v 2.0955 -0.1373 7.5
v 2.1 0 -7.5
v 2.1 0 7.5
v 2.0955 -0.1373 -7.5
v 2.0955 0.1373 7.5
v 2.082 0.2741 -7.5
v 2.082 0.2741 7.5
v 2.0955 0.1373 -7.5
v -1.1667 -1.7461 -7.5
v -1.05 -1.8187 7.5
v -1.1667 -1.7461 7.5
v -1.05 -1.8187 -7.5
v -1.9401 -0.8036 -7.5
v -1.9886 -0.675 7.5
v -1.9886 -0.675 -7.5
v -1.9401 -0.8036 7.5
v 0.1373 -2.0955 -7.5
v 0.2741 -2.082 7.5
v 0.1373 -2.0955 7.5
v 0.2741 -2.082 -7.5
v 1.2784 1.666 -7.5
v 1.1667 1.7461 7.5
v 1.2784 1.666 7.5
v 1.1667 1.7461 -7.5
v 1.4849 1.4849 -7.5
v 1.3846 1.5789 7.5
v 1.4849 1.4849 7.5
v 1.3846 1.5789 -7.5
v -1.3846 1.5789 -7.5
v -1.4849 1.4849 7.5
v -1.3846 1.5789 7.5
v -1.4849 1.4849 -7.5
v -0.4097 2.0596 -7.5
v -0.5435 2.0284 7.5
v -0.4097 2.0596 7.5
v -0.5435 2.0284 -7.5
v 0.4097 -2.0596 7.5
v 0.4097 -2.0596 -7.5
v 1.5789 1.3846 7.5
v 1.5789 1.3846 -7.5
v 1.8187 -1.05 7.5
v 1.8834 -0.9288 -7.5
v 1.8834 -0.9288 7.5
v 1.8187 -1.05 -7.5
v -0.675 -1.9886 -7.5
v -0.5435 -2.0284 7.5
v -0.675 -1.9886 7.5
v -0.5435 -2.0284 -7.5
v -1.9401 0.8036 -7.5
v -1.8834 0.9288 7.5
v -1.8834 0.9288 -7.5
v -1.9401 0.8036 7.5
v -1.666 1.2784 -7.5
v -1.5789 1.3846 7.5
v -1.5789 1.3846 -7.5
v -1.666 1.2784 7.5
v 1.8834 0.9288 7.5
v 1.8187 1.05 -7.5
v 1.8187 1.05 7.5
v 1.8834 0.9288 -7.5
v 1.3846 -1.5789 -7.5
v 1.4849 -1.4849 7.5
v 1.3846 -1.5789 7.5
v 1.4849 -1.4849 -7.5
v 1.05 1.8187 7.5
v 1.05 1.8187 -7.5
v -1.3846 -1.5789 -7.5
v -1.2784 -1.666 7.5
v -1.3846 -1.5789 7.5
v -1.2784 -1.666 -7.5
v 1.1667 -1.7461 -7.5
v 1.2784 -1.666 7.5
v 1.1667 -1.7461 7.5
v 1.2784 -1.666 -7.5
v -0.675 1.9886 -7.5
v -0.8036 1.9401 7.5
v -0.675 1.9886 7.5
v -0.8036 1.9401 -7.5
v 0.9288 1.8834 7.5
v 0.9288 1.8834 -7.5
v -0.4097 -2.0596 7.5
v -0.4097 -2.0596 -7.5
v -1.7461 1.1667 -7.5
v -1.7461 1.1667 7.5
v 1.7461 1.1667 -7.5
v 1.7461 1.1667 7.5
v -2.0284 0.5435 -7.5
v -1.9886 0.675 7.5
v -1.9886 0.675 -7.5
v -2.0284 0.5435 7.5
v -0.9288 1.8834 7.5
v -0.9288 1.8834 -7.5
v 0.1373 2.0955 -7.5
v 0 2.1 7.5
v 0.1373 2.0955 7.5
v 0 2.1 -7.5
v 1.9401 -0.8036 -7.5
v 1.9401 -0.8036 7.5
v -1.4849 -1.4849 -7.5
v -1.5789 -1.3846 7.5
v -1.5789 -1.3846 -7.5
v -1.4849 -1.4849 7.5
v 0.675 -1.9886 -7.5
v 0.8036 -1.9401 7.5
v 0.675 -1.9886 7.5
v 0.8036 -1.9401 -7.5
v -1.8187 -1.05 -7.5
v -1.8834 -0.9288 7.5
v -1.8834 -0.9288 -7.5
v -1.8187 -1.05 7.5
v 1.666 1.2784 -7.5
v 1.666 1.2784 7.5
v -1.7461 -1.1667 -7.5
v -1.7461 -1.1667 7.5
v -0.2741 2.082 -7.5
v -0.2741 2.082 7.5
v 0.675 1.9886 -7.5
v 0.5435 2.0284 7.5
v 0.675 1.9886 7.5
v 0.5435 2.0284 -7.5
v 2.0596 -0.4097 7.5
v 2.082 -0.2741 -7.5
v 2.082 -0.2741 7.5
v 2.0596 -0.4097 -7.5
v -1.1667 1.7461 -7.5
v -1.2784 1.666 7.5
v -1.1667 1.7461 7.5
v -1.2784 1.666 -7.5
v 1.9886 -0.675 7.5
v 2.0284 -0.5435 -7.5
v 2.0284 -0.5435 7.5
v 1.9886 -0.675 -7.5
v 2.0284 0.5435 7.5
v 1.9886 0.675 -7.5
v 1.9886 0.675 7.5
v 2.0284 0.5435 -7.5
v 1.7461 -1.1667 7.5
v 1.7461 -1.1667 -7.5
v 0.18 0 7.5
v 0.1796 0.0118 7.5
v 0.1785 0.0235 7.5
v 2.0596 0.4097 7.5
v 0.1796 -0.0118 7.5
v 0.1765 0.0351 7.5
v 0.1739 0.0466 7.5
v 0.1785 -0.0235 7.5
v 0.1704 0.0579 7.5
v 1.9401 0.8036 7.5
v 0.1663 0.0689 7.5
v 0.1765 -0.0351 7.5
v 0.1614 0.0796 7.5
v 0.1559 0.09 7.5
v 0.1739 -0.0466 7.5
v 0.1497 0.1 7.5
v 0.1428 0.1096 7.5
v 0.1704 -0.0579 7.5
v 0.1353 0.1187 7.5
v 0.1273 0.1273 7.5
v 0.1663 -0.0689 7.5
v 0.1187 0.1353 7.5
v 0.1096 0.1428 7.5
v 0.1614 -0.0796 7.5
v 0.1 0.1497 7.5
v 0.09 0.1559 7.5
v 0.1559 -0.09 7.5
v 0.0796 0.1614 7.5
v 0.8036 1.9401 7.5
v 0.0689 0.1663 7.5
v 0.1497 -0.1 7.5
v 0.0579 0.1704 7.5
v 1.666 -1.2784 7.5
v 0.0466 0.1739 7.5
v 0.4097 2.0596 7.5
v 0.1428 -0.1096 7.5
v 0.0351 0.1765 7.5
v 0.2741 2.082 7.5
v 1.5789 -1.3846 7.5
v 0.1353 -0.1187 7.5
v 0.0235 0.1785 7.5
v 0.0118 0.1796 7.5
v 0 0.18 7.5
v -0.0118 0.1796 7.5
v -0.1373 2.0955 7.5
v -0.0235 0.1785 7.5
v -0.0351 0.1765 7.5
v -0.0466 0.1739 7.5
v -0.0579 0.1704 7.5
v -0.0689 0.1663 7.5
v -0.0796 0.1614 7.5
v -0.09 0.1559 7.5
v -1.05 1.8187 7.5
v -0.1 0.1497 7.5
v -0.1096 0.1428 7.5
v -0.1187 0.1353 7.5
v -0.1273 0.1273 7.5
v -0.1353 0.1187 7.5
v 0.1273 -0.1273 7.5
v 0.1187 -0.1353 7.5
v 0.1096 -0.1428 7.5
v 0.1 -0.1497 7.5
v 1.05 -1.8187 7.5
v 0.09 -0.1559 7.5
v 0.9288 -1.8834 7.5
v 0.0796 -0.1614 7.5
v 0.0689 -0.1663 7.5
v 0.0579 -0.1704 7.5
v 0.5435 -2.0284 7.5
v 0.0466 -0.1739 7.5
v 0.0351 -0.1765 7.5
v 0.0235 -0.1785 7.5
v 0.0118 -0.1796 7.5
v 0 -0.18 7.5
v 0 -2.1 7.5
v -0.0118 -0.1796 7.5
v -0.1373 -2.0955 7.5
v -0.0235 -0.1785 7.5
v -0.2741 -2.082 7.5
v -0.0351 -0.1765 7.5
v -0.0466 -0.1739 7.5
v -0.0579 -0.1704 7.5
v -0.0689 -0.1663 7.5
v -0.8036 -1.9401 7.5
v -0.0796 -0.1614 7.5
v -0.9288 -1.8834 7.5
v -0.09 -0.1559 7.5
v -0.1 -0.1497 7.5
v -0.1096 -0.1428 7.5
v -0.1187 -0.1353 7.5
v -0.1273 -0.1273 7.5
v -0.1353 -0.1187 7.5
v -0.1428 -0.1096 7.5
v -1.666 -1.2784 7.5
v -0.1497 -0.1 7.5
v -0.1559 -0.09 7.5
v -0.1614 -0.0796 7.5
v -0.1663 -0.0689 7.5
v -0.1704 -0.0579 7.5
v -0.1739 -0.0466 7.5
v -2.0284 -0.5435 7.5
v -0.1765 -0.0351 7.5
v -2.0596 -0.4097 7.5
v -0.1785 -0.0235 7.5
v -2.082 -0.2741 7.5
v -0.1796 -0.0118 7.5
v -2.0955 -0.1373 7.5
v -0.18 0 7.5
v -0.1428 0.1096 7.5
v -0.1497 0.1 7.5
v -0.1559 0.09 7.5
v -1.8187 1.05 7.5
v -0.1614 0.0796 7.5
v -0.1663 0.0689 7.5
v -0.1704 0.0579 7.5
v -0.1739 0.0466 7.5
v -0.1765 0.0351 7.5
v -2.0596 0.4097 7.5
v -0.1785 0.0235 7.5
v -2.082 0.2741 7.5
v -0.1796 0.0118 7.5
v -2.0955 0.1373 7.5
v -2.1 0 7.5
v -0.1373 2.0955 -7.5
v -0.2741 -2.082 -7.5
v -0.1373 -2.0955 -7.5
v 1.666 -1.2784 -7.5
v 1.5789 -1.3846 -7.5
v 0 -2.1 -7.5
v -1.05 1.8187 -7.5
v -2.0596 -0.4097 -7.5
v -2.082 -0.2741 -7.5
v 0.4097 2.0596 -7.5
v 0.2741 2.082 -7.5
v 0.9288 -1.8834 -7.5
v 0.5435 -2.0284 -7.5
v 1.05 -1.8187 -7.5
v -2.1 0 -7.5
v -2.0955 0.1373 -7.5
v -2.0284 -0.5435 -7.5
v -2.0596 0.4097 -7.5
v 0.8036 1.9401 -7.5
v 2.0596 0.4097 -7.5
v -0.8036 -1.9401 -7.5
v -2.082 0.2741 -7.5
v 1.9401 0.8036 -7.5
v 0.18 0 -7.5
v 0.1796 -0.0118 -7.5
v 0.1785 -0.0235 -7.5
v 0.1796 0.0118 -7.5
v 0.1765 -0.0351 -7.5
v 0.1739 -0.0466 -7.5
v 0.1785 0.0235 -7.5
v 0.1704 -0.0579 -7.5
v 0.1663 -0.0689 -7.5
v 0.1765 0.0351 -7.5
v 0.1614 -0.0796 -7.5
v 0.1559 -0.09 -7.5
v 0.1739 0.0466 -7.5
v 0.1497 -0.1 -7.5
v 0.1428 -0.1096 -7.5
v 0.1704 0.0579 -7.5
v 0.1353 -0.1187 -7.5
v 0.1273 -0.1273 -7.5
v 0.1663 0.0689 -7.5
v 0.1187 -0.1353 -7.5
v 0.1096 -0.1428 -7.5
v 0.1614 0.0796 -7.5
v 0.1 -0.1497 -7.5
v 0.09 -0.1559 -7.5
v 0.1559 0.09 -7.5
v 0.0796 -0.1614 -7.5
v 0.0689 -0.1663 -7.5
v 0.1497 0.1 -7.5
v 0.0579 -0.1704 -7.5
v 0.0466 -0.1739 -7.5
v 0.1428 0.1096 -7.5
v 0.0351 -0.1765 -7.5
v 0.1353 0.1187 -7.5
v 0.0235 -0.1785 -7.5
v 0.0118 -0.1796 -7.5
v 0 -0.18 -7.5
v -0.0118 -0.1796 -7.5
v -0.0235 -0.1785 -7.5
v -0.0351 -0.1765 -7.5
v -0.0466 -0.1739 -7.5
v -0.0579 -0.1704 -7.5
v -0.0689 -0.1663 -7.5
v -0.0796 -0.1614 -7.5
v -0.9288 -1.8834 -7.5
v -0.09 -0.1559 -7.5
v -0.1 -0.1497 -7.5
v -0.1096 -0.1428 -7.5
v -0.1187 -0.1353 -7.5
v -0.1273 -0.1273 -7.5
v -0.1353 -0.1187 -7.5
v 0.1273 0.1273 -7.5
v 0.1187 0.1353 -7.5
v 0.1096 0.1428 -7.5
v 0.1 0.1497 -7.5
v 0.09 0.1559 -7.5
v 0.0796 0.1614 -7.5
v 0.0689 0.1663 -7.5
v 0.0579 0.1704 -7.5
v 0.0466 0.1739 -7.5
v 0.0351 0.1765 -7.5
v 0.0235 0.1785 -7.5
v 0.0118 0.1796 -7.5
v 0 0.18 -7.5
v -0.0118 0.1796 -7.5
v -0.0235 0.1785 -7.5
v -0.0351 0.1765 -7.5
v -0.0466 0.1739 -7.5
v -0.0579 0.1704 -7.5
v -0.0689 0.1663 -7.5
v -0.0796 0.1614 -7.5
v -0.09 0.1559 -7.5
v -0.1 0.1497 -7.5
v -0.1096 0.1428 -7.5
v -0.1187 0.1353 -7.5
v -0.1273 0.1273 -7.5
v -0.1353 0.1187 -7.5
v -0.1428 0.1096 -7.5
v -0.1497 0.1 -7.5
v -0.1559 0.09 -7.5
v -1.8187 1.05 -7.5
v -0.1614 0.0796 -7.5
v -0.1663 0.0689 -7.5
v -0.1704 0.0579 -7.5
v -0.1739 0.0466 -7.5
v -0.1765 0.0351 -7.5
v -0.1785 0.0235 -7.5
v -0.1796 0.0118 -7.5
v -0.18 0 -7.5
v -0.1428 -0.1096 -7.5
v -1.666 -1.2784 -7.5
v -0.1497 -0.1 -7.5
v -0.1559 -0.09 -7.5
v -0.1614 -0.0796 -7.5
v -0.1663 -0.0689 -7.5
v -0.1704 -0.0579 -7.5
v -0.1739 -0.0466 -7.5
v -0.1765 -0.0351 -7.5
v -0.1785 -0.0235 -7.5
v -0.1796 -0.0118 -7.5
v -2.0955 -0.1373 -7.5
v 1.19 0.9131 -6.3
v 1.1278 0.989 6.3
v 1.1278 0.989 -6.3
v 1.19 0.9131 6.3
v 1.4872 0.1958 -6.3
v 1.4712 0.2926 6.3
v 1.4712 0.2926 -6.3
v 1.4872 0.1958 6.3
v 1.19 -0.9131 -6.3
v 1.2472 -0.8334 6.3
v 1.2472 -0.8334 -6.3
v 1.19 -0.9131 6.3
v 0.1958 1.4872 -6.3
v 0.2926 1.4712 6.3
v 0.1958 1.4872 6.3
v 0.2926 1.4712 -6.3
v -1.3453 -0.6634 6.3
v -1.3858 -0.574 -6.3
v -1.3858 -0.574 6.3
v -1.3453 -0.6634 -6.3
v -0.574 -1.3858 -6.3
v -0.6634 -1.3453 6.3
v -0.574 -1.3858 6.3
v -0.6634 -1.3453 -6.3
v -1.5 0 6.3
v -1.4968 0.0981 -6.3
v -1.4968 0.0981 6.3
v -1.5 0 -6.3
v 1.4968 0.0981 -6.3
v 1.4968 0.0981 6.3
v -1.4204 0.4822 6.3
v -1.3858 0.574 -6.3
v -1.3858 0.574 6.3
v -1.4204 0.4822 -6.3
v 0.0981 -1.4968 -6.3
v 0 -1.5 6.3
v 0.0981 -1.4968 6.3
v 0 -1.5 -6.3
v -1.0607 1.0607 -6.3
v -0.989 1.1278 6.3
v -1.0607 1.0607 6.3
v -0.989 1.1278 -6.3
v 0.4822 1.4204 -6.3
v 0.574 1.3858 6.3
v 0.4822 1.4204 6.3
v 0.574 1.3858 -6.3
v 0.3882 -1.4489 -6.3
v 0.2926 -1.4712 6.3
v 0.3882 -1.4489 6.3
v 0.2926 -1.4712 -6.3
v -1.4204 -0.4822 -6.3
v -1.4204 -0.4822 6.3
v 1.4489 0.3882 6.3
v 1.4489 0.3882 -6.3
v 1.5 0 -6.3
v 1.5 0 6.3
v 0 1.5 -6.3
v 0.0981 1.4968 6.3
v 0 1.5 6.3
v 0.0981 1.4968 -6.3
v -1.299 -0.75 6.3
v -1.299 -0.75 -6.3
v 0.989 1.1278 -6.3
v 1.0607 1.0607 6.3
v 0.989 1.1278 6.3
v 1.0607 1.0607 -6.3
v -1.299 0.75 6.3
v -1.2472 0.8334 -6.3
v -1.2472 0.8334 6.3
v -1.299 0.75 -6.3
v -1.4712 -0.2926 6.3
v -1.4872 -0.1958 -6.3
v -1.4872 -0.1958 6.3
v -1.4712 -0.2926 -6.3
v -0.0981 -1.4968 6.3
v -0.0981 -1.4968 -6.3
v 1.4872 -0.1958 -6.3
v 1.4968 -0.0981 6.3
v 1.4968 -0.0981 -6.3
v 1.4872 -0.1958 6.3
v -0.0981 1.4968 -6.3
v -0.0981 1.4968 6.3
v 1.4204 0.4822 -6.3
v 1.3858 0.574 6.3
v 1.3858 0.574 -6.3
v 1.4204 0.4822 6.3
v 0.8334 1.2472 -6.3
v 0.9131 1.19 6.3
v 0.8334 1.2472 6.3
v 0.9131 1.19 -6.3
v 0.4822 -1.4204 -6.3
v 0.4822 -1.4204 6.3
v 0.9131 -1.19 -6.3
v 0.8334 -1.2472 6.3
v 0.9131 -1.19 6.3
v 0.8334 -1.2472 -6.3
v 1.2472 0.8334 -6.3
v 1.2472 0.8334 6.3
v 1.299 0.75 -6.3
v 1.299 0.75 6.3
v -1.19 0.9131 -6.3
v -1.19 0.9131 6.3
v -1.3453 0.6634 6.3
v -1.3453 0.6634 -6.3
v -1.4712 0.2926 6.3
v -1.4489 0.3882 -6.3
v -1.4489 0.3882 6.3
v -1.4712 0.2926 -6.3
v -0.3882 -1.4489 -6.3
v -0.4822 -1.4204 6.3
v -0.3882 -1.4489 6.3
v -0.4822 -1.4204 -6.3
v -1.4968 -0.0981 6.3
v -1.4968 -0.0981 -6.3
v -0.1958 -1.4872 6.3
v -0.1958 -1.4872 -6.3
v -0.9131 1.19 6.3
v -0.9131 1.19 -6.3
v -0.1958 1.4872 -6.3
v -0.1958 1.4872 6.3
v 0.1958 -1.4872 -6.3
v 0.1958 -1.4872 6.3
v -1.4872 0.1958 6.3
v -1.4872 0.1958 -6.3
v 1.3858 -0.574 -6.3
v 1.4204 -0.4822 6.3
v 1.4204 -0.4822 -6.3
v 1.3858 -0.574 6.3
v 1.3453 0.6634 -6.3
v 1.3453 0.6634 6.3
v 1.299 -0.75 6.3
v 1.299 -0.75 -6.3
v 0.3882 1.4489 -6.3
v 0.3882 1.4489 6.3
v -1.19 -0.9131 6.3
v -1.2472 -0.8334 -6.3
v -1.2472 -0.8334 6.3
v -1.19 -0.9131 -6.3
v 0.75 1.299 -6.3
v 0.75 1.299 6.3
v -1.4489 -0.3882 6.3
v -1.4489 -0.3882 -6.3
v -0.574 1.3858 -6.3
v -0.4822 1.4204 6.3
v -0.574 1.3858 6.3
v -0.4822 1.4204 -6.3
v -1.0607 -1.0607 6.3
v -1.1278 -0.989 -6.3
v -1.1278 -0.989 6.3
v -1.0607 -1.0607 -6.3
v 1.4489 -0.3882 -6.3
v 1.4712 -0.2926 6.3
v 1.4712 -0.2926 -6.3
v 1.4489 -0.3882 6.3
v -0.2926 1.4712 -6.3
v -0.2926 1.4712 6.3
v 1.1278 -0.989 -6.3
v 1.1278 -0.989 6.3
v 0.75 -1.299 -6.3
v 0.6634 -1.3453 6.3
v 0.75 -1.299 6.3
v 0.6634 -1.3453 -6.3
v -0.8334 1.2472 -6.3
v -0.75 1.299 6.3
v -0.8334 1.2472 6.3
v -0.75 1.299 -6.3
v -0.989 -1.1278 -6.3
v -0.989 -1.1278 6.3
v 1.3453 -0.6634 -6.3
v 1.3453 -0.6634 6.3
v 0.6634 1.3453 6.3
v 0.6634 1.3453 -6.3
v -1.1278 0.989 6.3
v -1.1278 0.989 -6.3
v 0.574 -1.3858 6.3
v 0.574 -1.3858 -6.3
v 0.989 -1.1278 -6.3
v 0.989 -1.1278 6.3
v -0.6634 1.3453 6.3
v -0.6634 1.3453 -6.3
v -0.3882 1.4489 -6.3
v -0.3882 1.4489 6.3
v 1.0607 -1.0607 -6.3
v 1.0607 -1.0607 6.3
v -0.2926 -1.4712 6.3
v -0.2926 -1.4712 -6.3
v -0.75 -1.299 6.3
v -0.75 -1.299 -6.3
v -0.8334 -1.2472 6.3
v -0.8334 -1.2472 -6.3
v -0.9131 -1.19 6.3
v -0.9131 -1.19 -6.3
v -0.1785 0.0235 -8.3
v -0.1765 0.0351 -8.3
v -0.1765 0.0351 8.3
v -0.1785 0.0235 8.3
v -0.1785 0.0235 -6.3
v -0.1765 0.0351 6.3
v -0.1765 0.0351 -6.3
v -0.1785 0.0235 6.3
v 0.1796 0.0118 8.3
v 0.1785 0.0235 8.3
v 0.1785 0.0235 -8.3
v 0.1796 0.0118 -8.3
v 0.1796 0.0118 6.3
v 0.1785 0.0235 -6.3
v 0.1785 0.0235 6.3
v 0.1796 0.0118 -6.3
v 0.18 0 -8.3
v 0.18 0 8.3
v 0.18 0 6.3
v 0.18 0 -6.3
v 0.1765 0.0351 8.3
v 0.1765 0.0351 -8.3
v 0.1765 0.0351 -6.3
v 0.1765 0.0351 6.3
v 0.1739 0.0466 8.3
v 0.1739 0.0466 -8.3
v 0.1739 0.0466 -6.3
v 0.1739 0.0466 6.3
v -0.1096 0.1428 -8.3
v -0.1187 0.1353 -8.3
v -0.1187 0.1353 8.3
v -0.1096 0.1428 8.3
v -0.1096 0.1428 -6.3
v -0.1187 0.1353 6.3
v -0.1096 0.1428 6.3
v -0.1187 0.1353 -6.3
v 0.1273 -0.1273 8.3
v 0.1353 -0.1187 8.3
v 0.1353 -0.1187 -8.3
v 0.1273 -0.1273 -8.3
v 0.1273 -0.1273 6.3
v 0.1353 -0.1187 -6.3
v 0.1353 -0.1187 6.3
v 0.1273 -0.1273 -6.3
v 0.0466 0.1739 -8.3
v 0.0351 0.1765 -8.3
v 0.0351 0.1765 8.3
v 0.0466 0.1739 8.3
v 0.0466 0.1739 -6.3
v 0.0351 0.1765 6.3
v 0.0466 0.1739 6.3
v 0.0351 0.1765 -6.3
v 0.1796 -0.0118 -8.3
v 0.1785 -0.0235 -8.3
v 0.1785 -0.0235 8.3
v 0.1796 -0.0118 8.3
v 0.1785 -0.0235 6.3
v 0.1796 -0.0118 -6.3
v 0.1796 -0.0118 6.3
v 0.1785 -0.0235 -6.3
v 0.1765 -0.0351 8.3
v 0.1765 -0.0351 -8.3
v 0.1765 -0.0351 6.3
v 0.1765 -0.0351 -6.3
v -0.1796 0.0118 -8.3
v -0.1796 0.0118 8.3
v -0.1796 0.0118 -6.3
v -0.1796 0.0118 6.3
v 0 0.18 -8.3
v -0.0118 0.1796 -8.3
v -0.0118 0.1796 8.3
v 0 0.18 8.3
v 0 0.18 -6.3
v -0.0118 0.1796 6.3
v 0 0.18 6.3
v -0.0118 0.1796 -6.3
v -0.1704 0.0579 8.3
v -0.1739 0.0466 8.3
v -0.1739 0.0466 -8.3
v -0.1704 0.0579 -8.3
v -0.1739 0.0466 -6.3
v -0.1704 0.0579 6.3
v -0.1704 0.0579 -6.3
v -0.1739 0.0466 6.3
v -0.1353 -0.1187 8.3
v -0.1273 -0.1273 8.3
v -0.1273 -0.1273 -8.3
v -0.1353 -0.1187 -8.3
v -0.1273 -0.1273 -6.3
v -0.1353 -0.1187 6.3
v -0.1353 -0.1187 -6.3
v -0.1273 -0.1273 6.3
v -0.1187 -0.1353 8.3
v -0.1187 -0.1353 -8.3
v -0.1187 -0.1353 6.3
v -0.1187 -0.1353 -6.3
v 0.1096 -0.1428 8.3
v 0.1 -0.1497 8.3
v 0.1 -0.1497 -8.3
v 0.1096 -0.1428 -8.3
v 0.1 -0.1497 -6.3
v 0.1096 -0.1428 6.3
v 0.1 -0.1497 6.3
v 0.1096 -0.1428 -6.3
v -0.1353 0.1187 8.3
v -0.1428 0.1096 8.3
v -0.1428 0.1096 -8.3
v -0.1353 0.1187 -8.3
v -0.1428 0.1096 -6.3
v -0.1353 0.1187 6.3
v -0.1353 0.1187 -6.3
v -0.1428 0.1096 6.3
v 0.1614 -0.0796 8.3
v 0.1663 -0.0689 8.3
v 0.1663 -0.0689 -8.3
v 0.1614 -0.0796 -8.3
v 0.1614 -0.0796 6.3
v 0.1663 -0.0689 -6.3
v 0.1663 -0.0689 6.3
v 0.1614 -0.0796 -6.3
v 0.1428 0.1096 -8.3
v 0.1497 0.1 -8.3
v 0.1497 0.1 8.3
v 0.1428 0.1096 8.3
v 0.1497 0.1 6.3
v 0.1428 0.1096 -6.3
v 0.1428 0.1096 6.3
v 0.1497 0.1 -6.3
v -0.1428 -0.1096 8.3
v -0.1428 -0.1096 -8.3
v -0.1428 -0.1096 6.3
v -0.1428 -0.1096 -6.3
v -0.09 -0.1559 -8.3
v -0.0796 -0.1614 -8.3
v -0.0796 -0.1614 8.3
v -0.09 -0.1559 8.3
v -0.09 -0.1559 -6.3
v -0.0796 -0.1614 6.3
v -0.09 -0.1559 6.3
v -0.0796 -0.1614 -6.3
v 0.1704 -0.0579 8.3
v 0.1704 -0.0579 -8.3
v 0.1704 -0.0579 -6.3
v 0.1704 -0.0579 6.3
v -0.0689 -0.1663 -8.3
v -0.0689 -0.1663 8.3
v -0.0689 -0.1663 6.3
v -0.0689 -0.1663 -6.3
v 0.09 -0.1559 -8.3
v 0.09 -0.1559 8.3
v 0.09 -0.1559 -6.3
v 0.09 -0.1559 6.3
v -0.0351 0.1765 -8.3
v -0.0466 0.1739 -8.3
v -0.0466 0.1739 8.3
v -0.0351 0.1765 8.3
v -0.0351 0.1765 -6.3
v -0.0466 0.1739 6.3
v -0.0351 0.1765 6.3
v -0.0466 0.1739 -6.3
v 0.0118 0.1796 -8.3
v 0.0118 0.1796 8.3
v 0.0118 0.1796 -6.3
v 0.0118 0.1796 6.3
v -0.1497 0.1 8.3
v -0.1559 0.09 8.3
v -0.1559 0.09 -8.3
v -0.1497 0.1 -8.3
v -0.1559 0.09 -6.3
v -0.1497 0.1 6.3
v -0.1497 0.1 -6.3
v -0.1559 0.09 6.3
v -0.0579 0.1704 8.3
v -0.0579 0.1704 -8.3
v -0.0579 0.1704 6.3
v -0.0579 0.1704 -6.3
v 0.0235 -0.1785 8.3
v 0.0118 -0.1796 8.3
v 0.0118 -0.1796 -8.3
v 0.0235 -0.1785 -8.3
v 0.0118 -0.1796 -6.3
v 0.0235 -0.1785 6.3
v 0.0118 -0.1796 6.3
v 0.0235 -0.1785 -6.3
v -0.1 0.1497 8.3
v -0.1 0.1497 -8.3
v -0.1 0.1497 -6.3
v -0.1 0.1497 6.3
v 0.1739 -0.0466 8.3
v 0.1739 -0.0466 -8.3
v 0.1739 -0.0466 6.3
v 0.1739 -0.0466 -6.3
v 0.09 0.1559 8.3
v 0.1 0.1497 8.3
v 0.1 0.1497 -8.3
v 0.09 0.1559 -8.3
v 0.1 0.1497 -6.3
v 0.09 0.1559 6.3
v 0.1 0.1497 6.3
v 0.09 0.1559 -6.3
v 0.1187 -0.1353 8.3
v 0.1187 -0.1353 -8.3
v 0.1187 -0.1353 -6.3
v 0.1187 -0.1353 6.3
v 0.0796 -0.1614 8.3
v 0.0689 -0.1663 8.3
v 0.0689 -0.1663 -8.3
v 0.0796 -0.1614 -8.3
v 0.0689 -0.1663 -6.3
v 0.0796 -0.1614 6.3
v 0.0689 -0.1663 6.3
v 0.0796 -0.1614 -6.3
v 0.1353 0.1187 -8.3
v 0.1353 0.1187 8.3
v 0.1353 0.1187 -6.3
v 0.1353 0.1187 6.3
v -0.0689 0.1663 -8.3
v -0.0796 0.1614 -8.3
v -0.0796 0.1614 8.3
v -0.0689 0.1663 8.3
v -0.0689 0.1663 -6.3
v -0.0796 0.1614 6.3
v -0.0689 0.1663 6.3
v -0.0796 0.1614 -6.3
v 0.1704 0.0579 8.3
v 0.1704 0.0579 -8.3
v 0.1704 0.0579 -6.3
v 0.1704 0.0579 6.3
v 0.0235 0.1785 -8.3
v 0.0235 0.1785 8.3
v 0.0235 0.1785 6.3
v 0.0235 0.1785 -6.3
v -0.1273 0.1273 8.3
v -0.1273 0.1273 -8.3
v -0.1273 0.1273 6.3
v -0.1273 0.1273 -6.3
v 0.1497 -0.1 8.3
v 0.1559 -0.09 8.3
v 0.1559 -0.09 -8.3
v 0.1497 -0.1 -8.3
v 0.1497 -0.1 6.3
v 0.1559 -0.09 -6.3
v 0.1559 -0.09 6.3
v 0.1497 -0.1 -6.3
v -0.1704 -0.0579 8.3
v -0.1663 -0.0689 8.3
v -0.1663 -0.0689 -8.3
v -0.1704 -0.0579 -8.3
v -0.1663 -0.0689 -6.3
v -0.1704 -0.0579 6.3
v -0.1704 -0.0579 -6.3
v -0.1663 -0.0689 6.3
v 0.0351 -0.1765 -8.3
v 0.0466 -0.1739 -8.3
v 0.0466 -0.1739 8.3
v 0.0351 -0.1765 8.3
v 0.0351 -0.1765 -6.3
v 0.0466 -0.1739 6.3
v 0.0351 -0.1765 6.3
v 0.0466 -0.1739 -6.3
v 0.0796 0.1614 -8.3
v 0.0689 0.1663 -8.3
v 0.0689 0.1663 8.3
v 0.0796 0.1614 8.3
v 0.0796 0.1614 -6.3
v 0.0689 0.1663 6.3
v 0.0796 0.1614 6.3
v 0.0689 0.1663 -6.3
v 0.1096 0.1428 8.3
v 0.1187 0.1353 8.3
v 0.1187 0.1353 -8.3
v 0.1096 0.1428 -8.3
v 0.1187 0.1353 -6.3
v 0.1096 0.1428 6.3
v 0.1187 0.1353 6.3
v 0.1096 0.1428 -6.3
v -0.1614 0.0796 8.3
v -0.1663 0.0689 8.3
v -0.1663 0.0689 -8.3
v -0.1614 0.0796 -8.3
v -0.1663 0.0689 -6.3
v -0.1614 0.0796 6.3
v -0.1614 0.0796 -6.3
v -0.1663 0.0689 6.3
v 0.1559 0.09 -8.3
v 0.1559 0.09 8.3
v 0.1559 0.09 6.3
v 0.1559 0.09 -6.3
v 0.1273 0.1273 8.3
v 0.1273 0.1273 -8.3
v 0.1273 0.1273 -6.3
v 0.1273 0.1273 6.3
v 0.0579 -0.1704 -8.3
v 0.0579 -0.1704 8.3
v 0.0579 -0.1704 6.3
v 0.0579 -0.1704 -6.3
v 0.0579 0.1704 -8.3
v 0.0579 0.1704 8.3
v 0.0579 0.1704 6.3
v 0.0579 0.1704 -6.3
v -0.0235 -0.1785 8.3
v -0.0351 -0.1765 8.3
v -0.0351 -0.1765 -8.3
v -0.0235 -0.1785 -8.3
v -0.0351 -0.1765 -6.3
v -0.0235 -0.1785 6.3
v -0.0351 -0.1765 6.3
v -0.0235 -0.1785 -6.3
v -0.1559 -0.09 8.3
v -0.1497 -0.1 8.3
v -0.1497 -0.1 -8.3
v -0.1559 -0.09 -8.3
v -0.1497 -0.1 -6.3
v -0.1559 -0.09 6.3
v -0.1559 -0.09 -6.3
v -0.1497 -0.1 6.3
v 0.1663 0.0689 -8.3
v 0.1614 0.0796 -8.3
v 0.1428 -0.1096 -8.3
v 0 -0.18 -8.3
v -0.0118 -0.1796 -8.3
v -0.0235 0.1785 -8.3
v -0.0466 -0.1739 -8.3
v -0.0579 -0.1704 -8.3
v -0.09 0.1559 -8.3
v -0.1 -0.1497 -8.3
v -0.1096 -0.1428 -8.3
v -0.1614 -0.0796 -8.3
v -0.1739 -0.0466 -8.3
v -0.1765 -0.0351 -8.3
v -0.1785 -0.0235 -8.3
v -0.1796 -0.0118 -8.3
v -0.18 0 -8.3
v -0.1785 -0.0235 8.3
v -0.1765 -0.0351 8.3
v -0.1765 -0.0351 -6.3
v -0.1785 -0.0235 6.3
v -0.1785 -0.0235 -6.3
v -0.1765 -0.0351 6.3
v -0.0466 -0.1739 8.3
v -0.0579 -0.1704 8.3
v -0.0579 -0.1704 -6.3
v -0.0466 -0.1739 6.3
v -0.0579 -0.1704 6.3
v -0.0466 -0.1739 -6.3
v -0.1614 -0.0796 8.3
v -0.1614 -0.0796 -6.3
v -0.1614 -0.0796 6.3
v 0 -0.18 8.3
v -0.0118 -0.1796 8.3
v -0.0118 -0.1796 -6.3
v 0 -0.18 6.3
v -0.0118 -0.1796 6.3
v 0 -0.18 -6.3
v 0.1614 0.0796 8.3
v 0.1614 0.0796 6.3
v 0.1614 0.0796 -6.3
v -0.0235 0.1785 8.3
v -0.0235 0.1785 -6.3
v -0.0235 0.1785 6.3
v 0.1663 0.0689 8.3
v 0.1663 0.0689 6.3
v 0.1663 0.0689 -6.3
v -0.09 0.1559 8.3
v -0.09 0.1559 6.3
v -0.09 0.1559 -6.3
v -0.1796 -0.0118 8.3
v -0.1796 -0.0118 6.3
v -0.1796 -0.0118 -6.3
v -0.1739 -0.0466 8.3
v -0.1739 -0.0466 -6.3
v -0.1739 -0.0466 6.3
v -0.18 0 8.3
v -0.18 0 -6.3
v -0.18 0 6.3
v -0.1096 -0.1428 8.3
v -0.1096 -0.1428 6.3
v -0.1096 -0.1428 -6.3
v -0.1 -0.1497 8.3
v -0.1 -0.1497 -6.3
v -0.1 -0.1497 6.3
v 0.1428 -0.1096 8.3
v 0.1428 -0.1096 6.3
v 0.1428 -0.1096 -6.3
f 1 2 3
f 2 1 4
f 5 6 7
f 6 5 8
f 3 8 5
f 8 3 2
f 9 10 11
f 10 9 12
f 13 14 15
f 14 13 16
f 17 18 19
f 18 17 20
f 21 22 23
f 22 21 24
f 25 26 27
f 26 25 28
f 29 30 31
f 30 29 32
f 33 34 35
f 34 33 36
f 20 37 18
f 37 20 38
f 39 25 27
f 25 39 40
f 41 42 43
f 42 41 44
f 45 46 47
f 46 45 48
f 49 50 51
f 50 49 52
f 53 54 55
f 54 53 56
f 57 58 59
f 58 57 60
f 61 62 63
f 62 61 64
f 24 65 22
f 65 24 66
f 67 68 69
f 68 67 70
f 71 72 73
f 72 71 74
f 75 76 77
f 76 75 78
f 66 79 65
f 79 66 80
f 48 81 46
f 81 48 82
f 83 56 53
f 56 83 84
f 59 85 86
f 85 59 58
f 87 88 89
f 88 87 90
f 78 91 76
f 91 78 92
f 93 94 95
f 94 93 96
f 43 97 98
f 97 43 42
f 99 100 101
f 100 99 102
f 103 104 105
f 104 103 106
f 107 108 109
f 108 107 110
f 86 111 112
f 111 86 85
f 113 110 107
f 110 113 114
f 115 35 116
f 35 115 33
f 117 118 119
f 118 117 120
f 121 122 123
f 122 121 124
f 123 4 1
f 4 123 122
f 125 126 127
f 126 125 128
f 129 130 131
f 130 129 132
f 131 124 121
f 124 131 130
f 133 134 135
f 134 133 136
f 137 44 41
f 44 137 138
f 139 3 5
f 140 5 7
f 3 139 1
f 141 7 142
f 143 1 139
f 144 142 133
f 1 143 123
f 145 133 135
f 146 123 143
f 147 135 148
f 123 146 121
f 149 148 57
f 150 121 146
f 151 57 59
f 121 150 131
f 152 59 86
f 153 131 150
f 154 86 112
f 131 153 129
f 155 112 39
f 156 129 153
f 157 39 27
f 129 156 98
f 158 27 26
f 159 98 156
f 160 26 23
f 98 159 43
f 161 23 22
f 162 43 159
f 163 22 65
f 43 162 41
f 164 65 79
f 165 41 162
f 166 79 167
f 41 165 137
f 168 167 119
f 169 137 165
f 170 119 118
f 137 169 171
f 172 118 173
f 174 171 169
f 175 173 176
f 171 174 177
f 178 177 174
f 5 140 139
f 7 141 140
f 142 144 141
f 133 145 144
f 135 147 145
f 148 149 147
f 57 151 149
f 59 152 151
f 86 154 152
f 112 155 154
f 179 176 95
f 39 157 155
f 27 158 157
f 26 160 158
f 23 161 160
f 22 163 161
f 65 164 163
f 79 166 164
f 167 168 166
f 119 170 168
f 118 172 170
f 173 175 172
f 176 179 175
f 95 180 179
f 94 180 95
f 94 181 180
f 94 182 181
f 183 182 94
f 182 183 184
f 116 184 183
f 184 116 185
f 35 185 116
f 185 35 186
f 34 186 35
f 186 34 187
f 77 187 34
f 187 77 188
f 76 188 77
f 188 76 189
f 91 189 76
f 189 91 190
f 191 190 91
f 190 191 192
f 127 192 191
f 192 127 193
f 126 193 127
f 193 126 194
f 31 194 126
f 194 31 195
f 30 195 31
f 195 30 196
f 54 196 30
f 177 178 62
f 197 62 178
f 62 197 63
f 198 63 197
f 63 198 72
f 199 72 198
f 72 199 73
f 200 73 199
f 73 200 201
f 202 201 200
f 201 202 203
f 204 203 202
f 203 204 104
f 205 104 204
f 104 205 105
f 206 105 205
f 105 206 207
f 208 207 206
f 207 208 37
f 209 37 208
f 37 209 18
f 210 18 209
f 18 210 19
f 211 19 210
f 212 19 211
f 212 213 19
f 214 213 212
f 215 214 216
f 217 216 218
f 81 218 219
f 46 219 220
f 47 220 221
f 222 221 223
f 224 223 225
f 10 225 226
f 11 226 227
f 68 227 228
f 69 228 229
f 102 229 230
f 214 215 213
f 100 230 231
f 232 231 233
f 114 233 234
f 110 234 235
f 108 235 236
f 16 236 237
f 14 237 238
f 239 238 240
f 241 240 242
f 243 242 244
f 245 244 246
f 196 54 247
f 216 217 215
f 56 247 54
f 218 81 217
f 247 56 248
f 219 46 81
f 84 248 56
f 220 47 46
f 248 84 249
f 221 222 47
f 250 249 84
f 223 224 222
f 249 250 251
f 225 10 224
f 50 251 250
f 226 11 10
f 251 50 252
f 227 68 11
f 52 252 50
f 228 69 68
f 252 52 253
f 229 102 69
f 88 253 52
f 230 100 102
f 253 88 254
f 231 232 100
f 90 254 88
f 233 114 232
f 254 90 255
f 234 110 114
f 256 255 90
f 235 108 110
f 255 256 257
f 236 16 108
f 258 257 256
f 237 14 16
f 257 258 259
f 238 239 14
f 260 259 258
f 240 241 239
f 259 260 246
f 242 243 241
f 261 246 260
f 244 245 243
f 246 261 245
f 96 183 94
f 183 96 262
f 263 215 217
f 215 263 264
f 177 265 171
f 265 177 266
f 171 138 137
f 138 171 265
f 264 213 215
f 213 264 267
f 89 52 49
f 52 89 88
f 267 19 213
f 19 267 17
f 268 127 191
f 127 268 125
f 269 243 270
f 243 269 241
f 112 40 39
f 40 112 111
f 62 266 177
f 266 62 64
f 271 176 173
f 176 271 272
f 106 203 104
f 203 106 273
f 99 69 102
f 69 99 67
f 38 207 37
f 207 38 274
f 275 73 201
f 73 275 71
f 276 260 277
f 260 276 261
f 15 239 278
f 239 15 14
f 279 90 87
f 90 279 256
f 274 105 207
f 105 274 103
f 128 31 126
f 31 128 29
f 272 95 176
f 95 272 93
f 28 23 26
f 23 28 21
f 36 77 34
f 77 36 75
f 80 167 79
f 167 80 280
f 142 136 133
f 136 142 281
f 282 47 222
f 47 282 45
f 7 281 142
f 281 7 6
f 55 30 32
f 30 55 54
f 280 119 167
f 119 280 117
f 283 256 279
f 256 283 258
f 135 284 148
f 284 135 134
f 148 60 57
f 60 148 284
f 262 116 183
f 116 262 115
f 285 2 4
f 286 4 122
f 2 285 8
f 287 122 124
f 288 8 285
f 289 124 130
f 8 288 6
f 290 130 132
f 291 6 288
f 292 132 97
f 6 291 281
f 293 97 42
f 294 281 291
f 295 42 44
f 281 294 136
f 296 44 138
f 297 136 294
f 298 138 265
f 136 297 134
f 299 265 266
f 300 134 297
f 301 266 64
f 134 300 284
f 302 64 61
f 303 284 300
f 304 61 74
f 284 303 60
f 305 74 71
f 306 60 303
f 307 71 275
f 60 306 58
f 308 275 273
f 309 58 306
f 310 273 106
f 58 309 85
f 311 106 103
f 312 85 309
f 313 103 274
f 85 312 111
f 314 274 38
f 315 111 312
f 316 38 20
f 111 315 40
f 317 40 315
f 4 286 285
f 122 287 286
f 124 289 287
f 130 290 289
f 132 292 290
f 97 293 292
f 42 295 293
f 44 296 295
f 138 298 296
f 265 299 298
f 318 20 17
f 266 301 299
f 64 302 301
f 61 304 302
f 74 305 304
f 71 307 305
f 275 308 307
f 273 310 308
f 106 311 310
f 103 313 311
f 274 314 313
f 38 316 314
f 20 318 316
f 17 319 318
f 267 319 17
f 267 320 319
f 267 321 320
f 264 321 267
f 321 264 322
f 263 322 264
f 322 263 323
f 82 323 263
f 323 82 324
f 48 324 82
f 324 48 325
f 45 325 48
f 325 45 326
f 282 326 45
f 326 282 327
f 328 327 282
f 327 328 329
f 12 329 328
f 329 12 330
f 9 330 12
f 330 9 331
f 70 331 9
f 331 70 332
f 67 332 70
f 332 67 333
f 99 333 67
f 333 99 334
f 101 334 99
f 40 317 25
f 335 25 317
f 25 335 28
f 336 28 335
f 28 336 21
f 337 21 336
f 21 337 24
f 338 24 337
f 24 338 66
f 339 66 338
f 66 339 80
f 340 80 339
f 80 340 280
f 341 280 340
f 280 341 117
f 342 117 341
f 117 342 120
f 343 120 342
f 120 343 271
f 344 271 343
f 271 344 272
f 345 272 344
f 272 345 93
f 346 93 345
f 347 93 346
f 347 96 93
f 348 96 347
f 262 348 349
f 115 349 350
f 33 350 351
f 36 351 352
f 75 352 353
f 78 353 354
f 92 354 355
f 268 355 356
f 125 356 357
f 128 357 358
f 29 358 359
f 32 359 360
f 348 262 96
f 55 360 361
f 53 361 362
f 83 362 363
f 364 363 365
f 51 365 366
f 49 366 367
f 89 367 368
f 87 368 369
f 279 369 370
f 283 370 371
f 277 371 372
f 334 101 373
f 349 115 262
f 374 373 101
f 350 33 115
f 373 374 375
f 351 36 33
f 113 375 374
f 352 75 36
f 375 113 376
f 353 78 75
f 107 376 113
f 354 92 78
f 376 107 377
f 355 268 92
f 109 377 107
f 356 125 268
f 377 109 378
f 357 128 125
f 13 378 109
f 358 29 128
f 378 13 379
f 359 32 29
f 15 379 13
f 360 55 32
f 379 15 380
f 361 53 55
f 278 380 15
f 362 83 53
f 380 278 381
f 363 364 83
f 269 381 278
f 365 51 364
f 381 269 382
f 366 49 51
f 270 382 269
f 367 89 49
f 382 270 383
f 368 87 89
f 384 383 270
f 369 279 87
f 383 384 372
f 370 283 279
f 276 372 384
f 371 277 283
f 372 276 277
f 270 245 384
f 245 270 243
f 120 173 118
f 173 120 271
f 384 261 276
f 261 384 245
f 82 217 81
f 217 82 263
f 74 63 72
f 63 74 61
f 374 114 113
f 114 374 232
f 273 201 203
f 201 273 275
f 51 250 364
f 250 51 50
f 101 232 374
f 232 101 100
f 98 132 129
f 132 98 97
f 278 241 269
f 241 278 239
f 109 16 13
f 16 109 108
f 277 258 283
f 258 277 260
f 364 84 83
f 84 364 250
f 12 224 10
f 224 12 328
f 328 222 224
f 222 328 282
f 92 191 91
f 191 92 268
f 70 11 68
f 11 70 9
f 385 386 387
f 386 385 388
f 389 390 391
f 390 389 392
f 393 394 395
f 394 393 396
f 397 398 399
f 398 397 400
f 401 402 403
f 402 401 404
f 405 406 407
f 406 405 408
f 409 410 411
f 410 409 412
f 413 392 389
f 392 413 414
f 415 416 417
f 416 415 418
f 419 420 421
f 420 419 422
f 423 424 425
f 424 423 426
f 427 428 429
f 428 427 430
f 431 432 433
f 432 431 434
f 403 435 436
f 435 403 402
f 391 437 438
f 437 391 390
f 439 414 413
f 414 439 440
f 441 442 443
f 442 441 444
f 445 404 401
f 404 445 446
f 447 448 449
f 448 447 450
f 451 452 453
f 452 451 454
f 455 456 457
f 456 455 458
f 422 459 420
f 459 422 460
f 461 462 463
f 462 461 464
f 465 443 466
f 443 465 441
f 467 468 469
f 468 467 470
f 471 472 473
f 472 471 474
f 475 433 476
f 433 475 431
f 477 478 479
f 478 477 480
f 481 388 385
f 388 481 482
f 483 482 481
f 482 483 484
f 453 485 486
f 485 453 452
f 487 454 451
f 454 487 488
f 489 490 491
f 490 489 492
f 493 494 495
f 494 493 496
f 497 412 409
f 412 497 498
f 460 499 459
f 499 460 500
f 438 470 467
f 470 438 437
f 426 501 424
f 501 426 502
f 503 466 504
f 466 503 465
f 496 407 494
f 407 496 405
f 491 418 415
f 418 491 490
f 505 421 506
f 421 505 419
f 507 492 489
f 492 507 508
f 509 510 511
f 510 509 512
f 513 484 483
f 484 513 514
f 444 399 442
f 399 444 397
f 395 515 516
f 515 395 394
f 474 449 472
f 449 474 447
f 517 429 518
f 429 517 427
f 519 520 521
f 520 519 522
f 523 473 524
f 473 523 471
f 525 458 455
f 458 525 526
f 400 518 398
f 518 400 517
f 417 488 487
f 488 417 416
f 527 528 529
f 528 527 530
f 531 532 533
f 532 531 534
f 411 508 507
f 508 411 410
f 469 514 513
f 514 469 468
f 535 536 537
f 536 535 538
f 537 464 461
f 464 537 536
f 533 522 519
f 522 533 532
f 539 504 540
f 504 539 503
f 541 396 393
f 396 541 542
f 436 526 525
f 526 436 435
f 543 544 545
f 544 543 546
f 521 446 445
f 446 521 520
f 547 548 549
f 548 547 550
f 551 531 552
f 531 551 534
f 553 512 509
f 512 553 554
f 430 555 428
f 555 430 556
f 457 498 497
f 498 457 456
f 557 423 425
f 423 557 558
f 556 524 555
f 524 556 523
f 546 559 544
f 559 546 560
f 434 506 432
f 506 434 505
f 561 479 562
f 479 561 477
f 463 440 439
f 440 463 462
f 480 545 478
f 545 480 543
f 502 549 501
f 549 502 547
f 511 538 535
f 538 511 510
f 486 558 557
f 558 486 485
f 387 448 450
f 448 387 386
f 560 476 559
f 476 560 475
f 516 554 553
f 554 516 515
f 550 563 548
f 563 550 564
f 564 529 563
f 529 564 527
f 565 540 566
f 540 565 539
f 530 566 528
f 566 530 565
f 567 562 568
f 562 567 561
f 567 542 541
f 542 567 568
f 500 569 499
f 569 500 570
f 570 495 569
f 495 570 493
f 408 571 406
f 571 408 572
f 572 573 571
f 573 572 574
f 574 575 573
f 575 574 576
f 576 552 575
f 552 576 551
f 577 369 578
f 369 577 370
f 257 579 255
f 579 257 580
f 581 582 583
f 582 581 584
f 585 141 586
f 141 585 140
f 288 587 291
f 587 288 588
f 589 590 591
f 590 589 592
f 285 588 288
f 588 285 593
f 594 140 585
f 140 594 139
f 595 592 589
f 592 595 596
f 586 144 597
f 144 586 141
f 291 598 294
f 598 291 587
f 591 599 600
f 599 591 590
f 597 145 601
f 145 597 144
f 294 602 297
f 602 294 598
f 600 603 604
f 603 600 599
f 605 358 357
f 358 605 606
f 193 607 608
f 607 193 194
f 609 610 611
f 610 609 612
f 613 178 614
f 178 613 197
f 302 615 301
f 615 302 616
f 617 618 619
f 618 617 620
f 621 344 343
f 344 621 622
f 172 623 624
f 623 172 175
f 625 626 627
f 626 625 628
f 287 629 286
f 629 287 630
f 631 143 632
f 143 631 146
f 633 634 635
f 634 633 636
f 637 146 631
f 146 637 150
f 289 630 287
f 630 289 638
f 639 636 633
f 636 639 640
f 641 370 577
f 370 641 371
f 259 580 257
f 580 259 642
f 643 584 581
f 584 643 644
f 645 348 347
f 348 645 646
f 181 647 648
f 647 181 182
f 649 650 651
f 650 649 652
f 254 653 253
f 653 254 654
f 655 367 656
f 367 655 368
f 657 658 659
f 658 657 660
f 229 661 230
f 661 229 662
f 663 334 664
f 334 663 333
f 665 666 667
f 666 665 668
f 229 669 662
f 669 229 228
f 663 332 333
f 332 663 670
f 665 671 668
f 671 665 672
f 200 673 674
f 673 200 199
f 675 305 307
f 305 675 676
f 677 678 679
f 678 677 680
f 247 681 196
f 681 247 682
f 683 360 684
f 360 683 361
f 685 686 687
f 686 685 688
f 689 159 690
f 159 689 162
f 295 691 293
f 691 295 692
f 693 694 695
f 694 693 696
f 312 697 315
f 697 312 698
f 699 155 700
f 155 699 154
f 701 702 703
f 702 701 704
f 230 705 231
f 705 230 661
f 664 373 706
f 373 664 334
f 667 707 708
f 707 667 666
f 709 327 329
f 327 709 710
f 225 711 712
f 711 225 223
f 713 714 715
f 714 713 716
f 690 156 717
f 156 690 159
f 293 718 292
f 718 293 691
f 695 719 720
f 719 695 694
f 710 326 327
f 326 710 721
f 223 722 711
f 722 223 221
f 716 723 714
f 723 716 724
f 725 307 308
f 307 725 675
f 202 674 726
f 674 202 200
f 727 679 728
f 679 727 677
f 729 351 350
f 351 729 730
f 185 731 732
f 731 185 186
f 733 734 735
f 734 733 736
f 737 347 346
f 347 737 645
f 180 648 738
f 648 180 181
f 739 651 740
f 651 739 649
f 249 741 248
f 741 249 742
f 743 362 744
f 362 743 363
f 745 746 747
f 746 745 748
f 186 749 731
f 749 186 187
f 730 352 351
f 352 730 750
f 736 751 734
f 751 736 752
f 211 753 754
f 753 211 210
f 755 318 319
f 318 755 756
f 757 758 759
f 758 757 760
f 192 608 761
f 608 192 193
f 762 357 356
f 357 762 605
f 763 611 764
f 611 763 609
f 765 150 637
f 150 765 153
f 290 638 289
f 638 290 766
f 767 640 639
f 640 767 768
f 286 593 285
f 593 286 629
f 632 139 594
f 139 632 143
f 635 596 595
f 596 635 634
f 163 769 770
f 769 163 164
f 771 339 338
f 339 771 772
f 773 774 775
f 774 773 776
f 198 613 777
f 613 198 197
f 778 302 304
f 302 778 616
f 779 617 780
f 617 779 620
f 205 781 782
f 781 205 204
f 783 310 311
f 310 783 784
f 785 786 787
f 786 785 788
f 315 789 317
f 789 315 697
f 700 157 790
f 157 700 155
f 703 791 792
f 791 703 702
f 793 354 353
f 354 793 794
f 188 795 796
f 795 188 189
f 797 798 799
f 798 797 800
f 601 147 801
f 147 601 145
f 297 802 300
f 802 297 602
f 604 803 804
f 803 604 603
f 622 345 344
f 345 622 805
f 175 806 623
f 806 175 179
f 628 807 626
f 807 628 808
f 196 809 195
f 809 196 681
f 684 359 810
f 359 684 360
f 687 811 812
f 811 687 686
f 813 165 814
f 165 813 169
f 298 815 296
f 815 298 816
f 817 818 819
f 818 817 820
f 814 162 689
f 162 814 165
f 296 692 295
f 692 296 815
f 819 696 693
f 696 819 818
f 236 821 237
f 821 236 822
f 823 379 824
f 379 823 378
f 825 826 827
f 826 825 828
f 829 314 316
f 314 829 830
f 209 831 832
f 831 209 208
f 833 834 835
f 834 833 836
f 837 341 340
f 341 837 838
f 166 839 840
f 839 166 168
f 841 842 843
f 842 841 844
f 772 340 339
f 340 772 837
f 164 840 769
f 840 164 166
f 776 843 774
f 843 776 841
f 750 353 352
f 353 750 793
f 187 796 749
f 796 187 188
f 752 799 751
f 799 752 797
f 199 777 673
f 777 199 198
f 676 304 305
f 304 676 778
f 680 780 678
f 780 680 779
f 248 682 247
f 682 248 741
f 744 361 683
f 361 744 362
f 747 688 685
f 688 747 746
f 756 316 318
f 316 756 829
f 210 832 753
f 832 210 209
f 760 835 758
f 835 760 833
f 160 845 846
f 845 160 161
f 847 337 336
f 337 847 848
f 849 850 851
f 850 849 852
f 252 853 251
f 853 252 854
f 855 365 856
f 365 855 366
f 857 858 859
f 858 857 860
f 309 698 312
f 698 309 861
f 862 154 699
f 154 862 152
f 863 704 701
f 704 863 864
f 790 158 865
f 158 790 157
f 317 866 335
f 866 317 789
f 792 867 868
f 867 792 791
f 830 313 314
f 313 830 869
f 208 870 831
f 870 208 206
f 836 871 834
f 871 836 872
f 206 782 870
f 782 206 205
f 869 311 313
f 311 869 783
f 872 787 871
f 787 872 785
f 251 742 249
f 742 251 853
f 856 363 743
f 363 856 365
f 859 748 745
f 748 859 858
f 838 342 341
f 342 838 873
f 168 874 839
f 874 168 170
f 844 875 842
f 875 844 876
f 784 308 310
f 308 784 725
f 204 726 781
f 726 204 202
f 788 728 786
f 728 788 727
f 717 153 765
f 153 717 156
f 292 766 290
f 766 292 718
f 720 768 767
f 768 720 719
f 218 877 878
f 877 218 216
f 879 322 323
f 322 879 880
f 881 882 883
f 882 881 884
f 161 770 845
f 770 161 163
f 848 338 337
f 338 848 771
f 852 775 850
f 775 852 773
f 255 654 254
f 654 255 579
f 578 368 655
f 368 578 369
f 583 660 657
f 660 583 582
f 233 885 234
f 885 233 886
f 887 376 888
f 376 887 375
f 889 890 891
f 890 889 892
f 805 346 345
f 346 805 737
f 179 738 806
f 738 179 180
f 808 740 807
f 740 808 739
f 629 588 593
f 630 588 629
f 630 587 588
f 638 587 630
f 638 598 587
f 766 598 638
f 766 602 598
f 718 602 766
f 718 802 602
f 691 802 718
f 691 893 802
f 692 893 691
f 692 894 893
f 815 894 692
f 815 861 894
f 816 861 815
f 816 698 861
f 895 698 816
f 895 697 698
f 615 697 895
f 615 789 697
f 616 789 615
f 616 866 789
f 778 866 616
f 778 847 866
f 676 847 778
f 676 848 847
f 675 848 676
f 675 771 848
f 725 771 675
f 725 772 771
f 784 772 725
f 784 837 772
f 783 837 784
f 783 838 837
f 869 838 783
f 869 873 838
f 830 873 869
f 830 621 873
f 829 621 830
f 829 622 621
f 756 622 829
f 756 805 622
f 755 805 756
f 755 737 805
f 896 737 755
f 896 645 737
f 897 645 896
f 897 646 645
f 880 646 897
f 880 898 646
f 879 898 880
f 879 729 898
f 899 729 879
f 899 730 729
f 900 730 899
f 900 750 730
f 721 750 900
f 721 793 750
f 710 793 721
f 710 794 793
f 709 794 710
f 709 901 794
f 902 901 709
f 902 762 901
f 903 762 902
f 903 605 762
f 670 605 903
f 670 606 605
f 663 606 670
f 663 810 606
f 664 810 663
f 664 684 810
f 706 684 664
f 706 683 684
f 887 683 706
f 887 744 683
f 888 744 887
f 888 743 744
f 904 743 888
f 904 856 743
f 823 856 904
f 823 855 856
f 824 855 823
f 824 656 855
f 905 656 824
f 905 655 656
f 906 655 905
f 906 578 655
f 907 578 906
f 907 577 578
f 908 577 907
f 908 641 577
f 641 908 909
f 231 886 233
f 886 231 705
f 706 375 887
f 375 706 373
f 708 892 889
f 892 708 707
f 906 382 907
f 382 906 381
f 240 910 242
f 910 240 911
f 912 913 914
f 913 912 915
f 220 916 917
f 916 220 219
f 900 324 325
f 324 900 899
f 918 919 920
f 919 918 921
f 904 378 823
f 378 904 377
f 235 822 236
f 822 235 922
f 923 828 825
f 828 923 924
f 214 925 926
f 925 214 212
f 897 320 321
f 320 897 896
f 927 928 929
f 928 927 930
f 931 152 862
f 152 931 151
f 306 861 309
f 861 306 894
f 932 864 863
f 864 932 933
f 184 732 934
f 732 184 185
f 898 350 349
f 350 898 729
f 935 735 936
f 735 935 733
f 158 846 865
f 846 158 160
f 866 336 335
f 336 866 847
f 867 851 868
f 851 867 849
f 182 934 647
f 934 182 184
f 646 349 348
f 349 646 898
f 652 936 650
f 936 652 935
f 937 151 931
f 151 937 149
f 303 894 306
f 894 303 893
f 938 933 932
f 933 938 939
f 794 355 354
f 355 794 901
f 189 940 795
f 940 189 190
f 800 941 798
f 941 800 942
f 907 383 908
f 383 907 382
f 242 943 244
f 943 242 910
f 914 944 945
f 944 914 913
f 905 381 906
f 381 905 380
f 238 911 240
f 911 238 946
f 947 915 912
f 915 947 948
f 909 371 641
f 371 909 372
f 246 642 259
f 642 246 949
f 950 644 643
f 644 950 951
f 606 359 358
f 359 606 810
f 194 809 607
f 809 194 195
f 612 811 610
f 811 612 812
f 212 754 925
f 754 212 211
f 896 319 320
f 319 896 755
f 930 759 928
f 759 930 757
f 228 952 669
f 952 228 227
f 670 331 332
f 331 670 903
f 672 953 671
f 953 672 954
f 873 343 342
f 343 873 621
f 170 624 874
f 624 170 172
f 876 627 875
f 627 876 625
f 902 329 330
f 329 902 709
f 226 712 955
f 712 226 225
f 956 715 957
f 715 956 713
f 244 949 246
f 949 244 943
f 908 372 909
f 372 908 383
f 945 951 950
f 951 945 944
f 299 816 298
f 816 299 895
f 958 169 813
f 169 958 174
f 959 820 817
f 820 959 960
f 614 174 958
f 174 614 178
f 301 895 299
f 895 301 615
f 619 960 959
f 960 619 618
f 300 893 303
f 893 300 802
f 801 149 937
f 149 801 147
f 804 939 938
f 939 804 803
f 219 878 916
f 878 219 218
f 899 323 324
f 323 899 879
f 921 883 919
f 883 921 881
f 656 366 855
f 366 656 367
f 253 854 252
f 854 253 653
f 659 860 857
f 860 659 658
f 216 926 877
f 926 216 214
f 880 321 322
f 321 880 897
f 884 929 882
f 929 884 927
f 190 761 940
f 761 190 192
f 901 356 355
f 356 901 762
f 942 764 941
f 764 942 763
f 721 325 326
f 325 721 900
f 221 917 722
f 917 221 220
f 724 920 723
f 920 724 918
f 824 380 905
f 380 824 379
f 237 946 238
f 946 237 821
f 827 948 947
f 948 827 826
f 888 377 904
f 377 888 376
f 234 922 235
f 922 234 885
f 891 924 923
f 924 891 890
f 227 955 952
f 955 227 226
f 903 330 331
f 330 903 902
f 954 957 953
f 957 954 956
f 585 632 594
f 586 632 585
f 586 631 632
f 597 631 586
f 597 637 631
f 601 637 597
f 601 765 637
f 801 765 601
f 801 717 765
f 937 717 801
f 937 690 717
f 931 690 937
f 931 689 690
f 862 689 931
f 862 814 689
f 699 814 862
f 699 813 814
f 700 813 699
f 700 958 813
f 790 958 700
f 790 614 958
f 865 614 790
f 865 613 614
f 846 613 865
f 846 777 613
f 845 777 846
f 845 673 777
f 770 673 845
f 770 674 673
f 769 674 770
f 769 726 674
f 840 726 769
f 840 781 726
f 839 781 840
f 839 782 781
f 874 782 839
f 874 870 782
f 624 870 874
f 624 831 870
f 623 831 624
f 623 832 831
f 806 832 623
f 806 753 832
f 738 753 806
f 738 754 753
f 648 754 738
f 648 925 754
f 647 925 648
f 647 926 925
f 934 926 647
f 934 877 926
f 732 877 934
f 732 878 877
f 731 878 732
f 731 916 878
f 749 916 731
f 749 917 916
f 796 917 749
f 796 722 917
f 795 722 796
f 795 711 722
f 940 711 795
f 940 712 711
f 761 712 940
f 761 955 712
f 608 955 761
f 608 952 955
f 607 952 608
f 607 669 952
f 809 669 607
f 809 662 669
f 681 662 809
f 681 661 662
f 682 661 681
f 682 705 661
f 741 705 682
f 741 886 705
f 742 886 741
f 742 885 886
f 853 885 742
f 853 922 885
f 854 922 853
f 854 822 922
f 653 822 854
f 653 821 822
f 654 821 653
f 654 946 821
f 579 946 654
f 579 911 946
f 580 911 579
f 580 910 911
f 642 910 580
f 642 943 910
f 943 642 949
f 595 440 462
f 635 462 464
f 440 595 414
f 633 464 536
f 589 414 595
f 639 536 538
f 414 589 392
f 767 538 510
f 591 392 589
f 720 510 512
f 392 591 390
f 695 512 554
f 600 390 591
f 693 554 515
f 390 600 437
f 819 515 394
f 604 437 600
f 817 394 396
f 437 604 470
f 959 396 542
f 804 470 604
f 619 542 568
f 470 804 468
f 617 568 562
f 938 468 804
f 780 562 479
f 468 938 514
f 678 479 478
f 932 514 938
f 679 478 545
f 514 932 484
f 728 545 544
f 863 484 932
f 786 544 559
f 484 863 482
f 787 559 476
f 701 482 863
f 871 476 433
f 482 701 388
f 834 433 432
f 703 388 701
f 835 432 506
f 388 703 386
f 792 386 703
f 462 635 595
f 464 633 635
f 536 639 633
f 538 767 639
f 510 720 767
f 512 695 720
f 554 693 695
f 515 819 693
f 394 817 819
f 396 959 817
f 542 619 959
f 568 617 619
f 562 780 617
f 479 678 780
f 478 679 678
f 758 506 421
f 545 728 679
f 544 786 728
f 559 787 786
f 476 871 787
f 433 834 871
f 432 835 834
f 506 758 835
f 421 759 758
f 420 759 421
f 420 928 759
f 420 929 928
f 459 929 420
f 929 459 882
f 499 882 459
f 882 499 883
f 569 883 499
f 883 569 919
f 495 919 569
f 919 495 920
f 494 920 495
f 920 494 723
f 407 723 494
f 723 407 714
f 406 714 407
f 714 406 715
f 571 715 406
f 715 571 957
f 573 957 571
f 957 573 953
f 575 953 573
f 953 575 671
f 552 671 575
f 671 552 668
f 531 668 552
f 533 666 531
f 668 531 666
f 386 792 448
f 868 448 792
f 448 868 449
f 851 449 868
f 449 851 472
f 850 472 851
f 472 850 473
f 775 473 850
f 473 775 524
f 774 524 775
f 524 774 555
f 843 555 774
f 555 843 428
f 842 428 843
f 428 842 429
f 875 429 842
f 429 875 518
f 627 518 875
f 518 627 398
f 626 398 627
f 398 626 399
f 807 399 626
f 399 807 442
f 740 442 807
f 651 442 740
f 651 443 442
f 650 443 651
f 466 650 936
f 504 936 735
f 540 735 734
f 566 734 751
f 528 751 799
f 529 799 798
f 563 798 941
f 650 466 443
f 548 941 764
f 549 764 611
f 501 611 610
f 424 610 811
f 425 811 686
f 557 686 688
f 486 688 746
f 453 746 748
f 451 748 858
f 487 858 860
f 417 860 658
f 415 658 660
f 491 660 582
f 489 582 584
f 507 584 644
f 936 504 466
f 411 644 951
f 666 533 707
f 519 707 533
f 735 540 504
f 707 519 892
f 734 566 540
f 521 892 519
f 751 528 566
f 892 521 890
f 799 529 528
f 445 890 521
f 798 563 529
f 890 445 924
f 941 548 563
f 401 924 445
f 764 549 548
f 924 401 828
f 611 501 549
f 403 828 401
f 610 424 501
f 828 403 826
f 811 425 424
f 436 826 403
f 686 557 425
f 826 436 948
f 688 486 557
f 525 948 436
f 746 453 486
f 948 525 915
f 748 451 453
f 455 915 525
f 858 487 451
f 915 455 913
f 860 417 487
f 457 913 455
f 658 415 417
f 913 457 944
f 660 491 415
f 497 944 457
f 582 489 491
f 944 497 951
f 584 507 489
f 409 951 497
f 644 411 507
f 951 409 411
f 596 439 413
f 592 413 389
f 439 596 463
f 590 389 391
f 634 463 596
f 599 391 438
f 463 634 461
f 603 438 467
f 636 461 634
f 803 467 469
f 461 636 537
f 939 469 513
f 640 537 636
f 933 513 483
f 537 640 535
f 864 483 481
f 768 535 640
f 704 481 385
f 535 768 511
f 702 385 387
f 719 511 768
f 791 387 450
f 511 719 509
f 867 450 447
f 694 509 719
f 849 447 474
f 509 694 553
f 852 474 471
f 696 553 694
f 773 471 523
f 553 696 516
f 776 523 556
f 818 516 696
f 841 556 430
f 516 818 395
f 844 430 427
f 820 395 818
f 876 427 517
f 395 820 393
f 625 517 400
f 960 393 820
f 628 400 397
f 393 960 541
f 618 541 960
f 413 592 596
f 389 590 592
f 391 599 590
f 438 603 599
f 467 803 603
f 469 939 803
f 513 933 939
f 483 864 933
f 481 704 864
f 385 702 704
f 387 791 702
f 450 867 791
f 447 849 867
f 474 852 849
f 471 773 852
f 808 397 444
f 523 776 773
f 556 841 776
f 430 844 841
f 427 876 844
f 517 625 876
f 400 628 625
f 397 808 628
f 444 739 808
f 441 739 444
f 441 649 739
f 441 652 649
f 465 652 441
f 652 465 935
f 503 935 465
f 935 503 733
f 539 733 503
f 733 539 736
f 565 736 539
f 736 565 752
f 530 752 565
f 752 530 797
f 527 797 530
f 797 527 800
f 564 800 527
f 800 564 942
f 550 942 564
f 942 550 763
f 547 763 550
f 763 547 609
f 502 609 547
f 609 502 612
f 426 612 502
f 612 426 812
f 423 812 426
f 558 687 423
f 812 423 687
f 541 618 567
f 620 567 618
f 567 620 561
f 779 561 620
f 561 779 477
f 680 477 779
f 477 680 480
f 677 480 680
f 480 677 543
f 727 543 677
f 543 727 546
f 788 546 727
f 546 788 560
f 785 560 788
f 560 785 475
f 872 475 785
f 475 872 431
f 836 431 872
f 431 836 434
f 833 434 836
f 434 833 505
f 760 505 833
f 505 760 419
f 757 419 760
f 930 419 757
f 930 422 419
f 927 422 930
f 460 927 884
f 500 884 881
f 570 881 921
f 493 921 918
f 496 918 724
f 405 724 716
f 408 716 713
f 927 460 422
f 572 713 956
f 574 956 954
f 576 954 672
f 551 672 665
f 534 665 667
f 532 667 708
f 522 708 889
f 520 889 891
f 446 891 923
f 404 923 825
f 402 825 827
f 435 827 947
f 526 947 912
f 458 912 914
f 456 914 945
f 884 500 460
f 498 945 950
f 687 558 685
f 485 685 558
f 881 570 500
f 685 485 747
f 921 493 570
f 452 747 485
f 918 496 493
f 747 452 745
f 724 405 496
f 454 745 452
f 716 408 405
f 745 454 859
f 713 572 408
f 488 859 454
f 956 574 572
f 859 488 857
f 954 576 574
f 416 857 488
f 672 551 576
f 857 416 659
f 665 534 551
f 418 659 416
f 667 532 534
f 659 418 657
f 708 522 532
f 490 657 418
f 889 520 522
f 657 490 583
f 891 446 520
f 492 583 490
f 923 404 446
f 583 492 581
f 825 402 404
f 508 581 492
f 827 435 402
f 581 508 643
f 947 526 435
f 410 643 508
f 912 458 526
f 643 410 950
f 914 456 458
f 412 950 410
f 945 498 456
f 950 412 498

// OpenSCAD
// Heatshrink sleeving (tubing) with an internal core that is PHYSICALLY FUSED
// to the sleeve via small end-plugs (no floating/disconnected rod).

// Parameters
length = 15;                 //[8:30:1]
inner_diameter = 3;          //[1.5:6:0.1]
wall_thickness = 0.6;        //[0.3:1.2:0.05]
center = true;               //[0:1:1]
forced_id = 0;               //[0:10:0.1]
eps_overlap = 0.8;           //[0.5:2:0.1]

// Rendering quality
$fn = 96;

// Derived dimensions
id = (forced_id > 0 ? forced_id : inner_diameter);
ir = id/2;
or = ir + wall_thickness;

// Core (blue rod) size
core_r = max(0.05, min(ir * 0.12, 0.25));

// Connection geometry: small "end plugs" that overlap the sleeve wall
// so the core is merged to the tubing (guaranteed intersection).
plug_len = 1.2;                         // 1–2mm recommended
plug_r   = min(or, ir + wall_thickness); // reach into wall region
z_end    = (center ? length/2 : length); // top end z of sleeve

// Tubing (hollow sleeve)
module tubing() {
  color([0.85, 0.85, 0.8])  // off-white heatshrink
  difference() {
    cylinder(r=or, h=length, center=center);
    cylinder(r=ir, h=length + 2*eps_overlap, center=center);
  }
}

// Internal core + fused end-plugs (single connected solid with sleeve)
module internal_core_fused() {
  color([0.1, 0.3, 0.9]) {
    union() {
      // Central rod inside the bore (kept small)
      cylinder(r=core_r, h=length + 2*eps_overlap, center=center);

      // Top plug: overlaps sleeve wall by extending radius into [ir, or]
      translate([0, 0,  z_end - plug_len/2])  // inside the sleeve end
        cylinder(r=plug_r, h=plug_len, center=true);

      // Bottom plug: same, at the other end
      translate([0, 0, -z_end + plug_len/2])
        cylinder(r=plug_r, h=plug_len, center=true);
    }
  }
}

// Assembly: one connected solid
union() {
  tubing();
  internal_core_fused();
}
